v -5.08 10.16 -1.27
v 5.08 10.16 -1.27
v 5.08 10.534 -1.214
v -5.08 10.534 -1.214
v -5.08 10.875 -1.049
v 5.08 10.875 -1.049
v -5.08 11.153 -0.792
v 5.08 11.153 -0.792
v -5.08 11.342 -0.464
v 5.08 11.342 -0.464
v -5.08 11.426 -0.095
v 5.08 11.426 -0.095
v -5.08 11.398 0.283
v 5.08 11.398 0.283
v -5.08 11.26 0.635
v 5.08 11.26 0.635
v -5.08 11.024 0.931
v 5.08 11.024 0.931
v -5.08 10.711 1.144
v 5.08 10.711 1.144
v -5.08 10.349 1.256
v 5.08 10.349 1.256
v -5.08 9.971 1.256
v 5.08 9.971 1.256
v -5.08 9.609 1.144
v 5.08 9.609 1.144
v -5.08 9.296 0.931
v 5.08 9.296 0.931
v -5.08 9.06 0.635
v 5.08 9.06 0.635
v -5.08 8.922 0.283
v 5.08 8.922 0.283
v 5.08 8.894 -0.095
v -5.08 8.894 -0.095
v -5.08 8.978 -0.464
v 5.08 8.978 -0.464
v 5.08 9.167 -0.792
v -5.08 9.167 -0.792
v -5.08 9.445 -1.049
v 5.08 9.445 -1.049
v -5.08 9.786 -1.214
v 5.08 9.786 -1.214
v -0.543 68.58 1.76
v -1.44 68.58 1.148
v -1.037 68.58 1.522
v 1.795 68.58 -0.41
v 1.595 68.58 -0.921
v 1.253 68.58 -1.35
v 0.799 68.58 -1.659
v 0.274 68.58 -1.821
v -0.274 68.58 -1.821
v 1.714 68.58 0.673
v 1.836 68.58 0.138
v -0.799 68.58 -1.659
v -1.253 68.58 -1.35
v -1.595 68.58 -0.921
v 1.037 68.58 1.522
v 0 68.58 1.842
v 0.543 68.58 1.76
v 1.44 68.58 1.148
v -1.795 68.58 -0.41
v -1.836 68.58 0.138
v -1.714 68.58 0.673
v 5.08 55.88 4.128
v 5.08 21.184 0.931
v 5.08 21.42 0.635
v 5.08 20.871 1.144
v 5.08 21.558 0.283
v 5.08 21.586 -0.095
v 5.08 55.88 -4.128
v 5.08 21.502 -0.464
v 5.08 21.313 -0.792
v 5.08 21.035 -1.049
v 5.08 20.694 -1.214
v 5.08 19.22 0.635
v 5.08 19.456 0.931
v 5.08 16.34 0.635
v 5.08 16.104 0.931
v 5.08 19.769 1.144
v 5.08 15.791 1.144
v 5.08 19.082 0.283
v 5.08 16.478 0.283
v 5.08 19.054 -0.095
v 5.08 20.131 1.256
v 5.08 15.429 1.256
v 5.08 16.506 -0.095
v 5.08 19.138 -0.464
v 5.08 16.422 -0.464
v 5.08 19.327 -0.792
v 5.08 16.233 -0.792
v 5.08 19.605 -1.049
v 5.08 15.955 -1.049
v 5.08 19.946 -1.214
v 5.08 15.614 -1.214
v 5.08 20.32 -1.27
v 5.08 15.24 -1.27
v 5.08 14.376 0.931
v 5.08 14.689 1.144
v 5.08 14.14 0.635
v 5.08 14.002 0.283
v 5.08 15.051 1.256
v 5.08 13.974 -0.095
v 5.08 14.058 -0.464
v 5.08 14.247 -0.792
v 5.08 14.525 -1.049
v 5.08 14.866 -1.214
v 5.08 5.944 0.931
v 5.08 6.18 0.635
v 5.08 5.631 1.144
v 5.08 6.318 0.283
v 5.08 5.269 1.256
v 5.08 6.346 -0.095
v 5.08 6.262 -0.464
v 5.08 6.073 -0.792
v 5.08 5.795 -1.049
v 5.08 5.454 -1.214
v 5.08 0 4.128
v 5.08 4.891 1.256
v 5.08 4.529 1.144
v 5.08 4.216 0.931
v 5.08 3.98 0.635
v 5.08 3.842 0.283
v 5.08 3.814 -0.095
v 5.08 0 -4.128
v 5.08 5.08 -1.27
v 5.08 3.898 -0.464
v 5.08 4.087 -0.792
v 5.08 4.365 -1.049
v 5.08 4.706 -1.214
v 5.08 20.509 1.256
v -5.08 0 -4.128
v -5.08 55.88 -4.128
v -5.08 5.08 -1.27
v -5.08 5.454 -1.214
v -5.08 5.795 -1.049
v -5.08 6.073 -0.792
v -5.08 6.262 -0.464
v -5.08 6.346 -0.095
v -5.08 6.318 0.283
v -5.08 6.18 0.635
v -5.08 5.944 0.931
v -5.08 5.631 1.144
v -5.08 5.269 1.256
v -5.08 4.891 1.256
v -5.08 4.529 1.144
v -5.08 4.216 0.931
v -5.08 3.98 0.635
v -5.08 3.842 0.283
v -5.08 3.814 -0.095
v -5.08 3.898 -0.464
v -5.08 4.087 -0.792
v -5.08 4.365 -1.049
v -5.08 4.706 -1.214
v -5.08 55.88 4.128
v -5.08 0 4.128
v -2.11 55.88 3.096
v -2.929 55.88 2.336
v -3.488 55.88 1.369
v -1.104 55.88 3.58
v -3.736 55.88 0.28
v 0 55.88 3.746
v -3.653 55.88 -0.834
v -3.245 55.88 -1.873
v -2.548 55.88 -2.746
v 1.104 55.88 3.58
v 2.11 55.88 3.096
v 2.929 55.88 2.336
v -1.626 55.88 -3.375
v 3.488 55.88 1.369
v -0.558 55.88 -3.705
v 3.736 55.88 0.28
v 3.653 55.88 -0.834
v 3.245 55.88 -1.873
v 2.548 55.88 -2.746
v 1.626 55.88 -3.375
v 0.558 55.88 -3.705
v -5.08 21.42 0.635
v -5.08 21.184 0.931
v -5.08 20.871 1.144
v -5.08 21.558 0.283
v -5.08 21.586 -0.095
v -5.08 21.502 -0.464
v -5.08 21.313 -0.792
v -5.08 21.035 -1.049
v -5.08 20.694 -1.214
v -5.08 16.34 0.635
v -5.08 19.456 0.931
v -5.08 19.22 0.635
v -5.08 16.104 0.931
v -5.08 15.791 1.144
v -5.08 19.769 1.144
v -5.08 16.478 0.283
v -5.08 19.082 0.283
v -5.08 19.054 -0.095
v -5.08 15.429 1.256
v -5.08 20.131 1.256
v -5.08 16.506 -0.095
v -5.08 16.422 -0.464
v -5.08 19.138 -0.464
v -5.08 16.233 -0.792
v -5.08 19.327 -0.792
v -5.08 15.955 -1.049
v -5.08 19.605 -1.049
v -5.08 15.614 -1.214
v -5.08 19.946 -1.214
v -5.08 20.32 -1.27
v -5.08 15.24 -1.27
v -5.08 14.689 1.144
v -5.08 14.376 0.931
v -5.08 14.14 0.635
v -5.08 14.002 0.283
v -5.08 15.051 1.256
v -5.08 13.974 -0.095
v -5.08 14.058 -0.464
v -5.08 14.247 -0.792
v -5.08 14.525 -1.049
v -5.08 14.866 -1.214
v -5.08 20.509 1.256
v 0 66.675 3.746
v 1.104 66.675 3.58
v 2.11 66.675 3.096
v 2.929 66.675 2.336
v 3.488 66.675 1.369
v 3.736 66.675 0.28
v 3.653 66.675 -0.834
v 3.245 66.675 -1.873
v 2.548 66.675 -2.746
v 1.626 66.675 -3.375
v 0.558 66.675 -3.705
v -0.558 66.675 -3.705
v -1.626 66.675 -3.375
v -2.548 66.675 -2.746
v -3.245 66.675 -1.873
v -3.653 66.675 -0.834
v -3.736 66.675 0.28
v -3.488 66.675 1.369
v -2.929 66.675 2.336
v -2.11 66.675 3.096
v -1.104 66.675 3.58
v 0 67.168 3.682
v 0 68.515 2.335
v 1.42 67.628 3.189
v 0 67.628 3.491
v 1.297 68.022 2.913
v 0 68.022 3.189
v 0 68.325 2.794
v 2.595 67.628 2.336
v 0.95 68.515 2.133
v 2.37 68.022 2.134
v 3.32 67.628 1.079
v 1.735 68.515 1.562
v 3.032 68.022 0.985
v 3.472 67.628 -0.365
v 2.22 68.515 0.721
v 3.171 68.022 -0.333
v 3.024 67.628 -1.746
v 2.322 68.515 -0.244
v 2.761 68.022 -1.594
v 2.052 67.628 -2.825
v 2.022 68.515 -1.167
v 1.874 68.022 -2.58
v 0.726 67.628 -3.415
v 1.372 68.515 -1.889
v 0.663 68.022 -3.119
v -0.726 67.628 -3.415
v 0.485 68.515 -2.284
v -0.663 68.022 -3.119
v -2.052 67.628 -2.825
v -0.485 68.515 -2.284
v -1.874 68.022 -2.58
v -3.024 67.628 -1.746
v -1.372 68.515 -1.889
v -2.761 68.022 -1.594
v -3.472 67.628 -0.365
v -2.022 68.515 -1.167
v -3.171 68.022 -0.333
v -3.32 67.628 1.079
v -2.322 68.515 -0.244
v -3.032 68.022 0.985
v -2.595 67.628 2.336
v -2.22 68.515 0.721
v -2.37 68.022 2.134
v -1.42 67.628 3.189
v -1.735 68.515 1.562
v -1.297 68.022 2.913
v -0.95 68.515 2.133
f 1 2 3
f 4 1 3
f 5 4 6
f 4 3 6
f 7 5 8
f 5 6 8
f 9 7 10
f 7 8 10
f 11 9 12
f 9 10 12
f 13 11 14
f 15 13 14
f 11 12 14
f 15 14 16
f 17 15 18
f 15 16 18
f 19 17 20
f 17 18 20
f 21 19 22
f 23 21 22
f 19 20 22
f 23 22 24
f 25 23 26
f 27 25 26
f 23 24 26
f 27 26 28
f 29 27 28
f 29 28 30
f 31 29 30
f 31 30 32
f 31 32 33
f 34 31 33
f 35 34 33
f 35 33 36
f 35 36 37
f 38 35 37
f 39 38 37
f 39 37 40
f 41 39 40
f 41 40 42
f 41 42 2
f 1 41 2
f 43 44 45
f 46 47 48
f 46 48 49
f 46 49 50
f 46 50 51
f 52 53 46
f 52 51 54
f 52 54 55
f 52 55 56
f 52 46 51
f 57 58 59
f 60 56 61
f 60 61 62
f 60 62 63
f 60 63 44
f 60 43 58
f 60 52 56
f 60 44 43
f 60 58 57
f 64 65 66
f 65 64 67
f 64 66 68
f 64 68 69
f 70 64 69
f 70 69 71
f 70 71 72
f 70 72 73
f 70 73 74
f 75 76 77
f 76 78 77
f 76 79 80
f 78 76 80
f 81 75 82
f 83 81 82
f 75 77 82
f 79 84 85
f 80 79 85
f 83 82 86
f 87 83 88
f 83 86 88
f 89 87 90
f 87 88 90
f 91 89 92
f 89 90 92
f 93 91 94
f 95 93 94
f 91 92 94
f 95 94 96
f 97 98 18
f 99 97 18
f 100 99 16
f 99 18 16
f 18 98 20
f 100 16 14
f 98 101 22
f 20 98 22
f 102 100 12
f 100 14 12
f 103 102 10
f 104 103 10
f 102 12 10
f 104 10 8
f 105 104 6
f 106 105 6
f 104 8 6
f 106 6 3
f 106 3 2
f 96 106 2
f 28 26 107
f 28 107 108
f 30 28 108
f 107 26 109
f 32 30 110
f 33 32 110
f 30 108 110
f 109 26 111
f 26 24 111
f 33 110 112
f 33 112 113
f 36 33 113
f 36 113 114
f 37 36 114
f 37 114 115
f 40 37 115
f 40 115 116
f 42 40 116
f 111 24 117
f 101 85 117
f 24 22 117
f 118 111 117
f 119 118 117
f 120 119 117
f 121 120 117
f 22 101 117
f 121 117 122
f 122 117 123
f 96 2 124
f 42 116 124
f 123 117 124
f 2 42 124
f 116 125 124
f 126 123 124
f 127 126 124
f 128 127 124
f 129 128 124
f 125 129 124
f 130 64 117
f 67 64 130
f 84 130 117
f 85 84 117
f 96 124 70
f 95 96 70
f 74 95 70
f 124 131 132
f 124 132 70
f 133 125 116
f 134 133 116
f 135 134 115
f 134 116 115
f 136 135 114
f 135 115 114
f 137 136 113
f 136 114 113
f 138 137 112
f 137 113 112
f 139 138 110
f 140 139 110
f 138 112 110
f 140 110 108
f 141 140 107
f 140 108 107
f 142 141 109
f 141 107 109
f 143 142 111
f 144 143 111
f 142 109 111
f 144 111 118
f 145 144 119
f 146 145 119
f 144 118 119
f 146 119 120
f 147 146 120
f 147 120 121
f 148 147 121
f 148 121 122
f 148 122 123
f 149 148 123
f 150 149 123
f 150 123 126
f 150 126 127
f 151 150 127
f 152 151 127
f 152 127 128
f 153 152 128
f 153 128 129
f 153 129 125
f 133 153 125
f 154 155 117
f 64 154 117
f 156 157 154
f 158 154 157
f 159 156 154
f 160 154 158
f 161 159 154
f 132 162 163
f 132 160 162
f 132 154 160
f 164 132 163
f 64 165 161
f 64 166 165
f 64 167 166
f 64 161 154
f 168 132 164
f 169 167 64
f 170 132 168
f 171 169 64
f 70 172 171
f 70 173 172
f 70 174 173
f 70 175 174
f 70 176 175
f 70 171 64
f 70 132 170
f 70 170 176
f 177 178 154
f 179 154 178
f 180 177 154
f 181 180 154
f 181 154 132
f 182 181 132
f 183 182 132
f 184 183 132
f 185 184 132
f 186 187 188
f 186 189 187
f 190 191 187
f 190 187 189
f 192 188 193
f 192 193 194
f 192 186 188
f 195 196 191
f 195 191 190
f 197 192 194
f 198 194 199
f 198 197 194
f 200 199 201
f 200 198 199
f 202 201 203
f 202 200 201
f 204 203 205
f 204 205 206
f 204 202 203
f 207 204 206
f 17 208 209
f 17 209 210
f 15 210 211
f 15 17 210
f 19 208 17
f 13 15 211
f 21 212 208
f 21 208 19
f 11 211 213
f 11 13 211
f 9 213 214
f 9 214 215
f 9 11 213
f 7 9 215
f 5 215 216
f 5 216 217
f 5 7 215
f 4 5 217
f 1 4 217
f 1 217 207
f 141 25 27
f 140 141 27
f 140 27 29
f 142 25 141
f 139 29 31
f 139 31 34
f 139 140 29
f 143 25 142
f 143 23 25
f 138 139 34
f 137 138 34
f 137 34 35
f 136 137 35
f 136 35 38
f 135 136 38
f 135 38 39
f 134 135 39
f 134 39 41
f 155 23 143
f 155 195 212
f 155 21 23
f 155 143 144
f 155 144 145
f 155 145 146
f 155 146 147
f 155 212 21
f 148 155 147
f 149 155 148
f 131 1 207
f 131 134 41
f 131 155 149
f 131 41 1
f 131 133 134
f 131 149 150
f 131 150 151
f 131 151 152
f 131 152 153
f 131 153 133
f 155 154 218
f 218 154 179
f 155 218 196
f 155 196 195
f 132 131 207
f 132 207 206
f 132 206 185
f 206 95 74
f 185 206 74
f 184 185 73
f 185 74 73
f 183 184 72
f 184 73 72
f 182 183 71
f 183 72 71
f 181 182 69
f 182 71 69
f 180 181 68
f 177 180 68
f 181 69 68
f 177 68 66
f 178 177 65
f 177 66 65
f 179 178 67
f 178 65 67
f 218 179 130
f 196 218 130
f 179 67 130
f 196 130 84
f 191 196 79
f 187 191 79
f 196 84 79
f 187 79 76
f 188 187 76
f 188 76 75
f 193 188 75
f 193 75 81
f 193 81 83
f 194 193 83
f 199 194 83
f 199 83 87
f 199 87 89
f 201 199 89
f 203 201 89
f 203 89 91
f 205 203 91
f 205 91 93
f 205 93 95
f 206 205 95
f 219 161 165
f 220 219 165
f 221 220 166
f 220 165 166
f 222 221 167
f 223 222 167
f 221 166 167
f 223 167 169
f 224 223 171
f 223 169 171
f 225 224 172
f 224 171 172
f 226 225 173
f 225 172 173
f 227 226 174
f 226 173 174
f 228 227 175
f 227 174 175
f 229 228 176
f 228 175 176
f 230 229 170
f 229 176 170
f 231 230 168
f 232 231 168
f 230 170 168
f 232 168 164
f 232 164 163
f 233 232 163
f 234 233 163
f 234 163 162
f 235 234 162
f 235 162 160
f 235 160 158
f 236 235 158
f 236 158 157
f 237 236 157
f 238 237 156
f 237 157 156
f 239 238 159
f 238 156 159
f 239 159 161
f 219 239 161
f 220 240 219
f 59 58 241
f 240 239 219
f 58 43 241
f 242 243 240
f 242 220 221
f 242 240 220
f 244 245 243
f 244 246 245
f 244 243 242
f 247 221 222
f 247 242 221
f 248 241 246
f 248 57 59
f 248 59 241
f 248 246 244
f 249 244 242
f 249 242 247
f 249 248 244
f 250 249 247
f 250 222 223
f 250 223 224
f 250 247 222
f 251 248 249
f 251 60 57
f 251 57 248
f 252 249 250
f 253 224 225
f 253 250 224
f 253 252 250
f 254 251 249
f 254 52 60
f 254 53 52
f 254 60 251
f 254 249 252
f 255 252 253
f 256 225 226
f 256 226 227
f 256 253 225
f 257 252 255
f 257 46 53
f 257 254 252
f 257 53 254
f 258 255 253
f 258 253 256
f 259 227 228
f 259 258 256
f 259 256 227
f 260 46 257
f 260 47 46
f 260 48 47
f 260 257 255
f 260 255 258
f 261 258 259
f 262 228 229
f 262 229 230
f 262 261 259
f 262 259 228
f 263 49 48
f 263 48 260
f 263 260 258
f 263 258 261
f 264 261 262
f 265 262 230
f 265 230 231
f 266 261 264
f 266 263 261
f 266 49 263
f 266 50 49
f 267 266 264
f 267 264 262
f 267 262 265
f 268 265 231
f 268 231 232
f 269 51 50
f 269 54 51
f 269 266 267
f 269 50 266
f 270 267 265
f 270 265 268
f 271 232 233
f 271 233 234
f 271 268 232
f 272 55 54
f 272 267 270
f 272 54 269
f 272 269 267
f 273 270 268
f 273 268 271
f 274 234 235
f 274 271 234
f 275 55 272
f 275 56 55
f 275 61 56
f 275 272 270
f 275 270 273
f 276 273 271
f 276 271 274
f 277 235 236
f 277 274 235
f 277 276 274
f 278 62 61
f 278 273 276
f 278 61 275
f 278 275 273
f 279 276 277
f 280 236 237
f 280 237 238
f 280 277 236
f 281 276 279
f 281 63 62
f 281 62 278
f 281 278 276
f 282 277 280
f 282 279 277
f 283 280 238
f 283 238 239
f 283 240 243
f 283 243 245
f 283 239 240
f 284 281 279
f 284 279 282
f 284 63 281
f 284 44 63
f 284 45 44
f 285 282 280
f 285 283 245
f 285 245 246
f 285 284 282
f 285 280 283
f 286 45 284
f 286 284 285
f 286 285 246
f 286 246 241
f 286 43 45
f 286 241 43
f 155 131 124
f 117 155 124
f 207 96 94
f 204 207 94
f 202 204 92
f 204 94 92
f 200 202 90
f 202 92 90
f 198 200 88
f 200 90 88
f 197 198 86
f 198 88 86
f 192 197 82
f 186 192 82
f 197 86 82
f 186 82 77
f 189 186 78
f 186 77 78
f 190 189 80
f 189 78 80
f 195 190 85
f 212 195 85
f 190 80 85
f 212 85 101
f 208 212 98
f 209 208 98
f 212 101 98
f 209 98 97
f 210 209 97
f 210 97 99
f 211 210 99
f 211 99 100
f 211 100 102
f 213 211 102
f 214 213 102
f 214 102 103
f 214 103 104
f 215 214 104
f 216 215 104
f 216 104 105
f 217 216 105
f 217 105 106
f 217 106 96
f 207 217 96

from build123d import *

# Parameters (mm, degrees)
SKETCH1_W           = 10.16
SKETCH1_H           = 8.255
BOSS_EXTRUDE1_DEPTH = 55.88
SKETCH2_R           = 3.7465
BOSS_EXTRUDE2_DEPTH = 12.7
SKETCH3_R           = 1.27
CUT_EXTRUDE2_DEPTH  = 70.451265332
LPATTERN1_COUNT     = 4
LPATTERN1_PITCH     = 5.08
FILLET1_R           = 1.905


with BuildPart() as part:
    # Sketch1 → Boss-Extrude1 (new body)
    with BuildSketch(Plane(origin=(0, 0, 0), x_dir=(1, 0, 0), z_dir=(0, 1, 0))):
        Rectangle(SKETCH1_W, SKETCH1_H)
    extrude(amount=BOSS_EXTRUDE1_DEPTH)

    # Sketch2 → Boss-Extrude2 (add)
    with BuildSketch(Plane(origin=(0, 55.88, 0), x_dir=(1, 0, 0), z_dir=(0, 1, 0))):
        with Locations(Location((0, 0, 0), (0, 0, 270))):
            Circle(SKETCH2_R)
    extrude(amount=BOSS_EXTRUDE2_DEPTH)

    # Sketch3 → Cut-Extrude2 (cut, through all)
    with BuildSketch(Plane(origin=(5.08, 0, 0), x_dir=(0, 0, -1), z_dir=(1, 0, 0))):
        with Locations((0, 5.08)):
            Circle(SKETCH3_R)
    cut_extrude2 = extrude(amount=-CUT_EXTRUDE2_DEPTH, mode=Mode.SUBTRACT)

    # LPattern1: Cut-Extrude2 ×4
    with Locations(*[(0, i * LPATTERN1_PITCH, 0) for i in range(1, LPATTERN1_COUNT)]):
        add(cut_extrude2, mode=Mode.SUBTRACT)

    # Fillet1
    fillet1_edges = [part.edges().sort_by_distance(p)[0] for p in [
        (0, 68.58, -3.7465),
    ]]
    fillet(fillet1_edges, radius=FILLET1_R)


solid = part.part
